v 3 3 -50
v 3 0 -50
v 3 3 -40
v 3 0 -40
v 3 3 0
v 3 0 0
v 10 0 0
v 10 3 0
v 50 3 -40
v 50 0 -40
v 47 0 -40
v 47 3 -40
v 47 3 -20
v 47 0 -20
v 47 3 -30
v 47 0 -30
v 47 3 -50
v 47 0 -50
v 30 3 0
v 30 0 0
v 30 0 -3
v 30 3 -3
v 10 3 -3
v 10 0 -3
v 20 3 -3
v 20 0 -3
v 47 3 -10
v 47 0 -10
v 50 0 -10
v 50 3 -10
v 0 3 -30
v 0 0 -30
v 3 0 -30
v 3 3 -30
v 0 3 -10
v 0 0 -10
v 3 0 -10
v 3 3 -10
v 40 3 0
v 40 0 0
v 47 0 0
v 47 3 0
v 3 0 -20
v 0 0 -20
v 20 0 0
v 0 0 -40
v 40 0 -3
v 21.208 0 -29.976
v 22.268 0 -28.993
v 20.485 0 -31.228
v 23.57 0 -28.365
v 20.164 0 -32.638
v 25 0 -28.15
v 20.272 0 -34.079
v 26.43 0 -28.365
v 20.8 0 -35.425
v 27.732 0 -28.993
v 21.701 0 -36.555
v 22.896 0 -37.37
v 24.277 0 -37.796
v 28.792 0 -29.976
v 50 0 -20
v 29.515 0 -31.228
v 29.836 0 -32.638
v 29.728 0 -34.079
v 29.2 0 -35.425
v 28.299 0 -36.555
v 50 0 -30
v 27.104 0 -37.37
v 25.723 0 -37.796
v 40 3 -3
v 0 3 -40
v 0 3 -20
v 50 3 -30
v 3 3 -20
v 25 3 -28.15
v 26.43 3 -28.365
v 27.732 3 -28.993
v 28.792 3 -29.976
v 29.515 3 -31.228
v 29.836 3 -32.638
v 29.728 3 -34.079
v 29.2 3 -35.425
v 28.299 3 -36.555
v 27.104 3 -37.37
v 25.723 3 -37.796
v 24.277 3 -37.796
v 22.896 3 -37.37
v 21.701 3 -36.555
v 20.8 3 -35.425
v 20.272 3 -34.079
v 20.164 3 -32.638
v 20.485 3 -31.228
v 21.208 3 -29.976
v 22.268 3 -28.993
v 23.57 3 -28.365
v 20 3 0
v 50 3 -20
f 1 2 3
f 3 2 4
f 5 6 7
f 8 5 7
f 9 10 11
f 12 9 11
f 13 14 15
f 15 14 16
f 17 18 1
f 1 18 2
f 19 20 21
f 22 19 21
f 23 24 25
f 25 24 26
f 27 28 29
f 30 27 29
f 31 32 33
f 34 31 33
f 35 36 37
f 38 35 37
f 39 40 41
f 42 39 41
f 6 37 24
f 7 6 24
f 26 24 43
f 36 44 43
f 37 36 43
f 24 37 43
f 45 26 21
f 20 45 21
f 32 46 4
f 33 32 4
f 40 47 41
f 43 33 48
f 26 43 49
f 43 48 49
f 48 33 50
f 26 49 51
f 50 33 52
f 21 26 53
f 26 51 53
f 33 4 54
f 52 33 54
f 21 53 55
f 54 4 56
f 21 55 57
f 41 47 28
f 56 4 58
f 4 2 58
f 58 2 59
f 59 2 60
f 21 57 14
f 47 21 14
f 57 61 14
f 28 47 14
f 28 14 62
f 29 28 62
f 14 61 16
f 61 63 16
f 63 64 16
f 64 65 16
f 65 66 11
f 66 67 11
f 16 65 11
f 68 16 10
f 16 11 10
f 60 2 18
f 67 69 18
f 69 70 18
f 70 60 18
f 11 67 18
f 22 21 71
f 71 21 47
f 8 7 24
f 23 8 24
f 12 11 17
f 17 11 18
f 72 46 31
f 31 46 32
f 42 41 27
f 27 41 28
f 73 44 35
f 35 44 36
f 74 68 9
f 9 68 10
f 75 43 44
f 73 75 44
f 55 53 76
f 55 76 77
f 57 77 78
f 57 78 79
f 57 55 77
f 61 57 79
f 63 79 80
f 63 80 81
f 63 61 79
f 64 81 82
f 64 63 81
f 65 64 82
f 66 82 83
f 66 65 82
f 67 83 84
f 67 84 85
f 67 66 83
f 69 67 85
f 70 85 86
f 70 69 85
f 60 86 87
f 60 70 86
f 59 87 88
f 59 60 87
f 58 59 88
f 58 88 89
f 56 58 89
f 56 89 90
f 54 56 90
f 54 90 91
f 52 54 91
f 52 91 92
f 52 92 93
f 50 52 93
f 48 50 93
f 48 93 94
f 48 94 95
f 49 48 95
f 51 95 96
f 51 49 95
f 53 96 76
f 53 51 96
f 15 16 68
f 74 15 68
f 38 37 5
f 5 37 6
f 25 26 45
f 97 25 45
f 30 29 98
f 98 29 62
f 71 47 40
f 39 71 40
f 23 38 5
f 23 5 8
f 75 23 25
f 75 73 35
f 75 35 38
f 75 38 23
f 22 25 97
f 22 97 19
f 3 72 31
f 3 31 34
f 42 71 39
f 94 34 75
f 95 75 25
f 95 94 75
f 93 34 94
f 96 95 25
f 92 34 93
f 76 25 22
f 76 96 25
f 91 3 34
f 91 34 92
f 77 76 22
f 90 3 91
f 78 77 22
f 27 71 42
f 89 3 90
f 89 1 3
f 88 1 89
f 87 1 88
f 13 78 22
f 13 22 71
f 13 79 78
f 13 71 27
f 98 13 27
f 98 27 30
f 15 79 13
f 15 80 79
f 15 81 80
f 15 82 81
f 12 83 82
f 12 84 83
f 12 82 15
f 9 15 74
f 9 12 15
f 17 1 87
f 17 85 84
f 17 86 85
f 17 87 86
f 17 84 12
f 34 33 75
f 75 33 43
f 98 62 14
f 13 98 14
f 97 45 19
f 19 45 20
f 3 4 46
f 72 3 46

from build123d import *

# Parameters (mm, degrees)
CROQUIS1_R              = 4.85
SALIENTE_EXTRUIR1_DEPTH = 3


with BuildPart() as part:
    # Croquis1 → Saliente-Extruir1 (new body)
    with BuildSketch(Plane(origin=(0, 0, 0), x_dir=(1, 0, 0), z_dir=(0, 1, 0))):
        Polygon((3, 10), (3, 0), (10, 0), (10, 3), (20, 3), (20, 0), (25, 0), (30, 0), (30, 3), (40, 3), (40, 0), (47, 0), (47, 10), (50, 10), (50, 20), (47, 20), (47, 30), (50, 30), (50, 40), (47, 40), (47, 50), (3, 50), (3, 40), (0, 40), (0, 30), (3, 30), (3, 20), (0, 20), (0, 10), align=None)
        with Locations(Location((25, 33, 0), (0, 0, 270))):
            Circle(CROQUIS1_R, mode=Mode.SUBTRACT)
    extrude(amount=SALIENTE_EXTRUIR1_DEPTH)


solid = part.part
